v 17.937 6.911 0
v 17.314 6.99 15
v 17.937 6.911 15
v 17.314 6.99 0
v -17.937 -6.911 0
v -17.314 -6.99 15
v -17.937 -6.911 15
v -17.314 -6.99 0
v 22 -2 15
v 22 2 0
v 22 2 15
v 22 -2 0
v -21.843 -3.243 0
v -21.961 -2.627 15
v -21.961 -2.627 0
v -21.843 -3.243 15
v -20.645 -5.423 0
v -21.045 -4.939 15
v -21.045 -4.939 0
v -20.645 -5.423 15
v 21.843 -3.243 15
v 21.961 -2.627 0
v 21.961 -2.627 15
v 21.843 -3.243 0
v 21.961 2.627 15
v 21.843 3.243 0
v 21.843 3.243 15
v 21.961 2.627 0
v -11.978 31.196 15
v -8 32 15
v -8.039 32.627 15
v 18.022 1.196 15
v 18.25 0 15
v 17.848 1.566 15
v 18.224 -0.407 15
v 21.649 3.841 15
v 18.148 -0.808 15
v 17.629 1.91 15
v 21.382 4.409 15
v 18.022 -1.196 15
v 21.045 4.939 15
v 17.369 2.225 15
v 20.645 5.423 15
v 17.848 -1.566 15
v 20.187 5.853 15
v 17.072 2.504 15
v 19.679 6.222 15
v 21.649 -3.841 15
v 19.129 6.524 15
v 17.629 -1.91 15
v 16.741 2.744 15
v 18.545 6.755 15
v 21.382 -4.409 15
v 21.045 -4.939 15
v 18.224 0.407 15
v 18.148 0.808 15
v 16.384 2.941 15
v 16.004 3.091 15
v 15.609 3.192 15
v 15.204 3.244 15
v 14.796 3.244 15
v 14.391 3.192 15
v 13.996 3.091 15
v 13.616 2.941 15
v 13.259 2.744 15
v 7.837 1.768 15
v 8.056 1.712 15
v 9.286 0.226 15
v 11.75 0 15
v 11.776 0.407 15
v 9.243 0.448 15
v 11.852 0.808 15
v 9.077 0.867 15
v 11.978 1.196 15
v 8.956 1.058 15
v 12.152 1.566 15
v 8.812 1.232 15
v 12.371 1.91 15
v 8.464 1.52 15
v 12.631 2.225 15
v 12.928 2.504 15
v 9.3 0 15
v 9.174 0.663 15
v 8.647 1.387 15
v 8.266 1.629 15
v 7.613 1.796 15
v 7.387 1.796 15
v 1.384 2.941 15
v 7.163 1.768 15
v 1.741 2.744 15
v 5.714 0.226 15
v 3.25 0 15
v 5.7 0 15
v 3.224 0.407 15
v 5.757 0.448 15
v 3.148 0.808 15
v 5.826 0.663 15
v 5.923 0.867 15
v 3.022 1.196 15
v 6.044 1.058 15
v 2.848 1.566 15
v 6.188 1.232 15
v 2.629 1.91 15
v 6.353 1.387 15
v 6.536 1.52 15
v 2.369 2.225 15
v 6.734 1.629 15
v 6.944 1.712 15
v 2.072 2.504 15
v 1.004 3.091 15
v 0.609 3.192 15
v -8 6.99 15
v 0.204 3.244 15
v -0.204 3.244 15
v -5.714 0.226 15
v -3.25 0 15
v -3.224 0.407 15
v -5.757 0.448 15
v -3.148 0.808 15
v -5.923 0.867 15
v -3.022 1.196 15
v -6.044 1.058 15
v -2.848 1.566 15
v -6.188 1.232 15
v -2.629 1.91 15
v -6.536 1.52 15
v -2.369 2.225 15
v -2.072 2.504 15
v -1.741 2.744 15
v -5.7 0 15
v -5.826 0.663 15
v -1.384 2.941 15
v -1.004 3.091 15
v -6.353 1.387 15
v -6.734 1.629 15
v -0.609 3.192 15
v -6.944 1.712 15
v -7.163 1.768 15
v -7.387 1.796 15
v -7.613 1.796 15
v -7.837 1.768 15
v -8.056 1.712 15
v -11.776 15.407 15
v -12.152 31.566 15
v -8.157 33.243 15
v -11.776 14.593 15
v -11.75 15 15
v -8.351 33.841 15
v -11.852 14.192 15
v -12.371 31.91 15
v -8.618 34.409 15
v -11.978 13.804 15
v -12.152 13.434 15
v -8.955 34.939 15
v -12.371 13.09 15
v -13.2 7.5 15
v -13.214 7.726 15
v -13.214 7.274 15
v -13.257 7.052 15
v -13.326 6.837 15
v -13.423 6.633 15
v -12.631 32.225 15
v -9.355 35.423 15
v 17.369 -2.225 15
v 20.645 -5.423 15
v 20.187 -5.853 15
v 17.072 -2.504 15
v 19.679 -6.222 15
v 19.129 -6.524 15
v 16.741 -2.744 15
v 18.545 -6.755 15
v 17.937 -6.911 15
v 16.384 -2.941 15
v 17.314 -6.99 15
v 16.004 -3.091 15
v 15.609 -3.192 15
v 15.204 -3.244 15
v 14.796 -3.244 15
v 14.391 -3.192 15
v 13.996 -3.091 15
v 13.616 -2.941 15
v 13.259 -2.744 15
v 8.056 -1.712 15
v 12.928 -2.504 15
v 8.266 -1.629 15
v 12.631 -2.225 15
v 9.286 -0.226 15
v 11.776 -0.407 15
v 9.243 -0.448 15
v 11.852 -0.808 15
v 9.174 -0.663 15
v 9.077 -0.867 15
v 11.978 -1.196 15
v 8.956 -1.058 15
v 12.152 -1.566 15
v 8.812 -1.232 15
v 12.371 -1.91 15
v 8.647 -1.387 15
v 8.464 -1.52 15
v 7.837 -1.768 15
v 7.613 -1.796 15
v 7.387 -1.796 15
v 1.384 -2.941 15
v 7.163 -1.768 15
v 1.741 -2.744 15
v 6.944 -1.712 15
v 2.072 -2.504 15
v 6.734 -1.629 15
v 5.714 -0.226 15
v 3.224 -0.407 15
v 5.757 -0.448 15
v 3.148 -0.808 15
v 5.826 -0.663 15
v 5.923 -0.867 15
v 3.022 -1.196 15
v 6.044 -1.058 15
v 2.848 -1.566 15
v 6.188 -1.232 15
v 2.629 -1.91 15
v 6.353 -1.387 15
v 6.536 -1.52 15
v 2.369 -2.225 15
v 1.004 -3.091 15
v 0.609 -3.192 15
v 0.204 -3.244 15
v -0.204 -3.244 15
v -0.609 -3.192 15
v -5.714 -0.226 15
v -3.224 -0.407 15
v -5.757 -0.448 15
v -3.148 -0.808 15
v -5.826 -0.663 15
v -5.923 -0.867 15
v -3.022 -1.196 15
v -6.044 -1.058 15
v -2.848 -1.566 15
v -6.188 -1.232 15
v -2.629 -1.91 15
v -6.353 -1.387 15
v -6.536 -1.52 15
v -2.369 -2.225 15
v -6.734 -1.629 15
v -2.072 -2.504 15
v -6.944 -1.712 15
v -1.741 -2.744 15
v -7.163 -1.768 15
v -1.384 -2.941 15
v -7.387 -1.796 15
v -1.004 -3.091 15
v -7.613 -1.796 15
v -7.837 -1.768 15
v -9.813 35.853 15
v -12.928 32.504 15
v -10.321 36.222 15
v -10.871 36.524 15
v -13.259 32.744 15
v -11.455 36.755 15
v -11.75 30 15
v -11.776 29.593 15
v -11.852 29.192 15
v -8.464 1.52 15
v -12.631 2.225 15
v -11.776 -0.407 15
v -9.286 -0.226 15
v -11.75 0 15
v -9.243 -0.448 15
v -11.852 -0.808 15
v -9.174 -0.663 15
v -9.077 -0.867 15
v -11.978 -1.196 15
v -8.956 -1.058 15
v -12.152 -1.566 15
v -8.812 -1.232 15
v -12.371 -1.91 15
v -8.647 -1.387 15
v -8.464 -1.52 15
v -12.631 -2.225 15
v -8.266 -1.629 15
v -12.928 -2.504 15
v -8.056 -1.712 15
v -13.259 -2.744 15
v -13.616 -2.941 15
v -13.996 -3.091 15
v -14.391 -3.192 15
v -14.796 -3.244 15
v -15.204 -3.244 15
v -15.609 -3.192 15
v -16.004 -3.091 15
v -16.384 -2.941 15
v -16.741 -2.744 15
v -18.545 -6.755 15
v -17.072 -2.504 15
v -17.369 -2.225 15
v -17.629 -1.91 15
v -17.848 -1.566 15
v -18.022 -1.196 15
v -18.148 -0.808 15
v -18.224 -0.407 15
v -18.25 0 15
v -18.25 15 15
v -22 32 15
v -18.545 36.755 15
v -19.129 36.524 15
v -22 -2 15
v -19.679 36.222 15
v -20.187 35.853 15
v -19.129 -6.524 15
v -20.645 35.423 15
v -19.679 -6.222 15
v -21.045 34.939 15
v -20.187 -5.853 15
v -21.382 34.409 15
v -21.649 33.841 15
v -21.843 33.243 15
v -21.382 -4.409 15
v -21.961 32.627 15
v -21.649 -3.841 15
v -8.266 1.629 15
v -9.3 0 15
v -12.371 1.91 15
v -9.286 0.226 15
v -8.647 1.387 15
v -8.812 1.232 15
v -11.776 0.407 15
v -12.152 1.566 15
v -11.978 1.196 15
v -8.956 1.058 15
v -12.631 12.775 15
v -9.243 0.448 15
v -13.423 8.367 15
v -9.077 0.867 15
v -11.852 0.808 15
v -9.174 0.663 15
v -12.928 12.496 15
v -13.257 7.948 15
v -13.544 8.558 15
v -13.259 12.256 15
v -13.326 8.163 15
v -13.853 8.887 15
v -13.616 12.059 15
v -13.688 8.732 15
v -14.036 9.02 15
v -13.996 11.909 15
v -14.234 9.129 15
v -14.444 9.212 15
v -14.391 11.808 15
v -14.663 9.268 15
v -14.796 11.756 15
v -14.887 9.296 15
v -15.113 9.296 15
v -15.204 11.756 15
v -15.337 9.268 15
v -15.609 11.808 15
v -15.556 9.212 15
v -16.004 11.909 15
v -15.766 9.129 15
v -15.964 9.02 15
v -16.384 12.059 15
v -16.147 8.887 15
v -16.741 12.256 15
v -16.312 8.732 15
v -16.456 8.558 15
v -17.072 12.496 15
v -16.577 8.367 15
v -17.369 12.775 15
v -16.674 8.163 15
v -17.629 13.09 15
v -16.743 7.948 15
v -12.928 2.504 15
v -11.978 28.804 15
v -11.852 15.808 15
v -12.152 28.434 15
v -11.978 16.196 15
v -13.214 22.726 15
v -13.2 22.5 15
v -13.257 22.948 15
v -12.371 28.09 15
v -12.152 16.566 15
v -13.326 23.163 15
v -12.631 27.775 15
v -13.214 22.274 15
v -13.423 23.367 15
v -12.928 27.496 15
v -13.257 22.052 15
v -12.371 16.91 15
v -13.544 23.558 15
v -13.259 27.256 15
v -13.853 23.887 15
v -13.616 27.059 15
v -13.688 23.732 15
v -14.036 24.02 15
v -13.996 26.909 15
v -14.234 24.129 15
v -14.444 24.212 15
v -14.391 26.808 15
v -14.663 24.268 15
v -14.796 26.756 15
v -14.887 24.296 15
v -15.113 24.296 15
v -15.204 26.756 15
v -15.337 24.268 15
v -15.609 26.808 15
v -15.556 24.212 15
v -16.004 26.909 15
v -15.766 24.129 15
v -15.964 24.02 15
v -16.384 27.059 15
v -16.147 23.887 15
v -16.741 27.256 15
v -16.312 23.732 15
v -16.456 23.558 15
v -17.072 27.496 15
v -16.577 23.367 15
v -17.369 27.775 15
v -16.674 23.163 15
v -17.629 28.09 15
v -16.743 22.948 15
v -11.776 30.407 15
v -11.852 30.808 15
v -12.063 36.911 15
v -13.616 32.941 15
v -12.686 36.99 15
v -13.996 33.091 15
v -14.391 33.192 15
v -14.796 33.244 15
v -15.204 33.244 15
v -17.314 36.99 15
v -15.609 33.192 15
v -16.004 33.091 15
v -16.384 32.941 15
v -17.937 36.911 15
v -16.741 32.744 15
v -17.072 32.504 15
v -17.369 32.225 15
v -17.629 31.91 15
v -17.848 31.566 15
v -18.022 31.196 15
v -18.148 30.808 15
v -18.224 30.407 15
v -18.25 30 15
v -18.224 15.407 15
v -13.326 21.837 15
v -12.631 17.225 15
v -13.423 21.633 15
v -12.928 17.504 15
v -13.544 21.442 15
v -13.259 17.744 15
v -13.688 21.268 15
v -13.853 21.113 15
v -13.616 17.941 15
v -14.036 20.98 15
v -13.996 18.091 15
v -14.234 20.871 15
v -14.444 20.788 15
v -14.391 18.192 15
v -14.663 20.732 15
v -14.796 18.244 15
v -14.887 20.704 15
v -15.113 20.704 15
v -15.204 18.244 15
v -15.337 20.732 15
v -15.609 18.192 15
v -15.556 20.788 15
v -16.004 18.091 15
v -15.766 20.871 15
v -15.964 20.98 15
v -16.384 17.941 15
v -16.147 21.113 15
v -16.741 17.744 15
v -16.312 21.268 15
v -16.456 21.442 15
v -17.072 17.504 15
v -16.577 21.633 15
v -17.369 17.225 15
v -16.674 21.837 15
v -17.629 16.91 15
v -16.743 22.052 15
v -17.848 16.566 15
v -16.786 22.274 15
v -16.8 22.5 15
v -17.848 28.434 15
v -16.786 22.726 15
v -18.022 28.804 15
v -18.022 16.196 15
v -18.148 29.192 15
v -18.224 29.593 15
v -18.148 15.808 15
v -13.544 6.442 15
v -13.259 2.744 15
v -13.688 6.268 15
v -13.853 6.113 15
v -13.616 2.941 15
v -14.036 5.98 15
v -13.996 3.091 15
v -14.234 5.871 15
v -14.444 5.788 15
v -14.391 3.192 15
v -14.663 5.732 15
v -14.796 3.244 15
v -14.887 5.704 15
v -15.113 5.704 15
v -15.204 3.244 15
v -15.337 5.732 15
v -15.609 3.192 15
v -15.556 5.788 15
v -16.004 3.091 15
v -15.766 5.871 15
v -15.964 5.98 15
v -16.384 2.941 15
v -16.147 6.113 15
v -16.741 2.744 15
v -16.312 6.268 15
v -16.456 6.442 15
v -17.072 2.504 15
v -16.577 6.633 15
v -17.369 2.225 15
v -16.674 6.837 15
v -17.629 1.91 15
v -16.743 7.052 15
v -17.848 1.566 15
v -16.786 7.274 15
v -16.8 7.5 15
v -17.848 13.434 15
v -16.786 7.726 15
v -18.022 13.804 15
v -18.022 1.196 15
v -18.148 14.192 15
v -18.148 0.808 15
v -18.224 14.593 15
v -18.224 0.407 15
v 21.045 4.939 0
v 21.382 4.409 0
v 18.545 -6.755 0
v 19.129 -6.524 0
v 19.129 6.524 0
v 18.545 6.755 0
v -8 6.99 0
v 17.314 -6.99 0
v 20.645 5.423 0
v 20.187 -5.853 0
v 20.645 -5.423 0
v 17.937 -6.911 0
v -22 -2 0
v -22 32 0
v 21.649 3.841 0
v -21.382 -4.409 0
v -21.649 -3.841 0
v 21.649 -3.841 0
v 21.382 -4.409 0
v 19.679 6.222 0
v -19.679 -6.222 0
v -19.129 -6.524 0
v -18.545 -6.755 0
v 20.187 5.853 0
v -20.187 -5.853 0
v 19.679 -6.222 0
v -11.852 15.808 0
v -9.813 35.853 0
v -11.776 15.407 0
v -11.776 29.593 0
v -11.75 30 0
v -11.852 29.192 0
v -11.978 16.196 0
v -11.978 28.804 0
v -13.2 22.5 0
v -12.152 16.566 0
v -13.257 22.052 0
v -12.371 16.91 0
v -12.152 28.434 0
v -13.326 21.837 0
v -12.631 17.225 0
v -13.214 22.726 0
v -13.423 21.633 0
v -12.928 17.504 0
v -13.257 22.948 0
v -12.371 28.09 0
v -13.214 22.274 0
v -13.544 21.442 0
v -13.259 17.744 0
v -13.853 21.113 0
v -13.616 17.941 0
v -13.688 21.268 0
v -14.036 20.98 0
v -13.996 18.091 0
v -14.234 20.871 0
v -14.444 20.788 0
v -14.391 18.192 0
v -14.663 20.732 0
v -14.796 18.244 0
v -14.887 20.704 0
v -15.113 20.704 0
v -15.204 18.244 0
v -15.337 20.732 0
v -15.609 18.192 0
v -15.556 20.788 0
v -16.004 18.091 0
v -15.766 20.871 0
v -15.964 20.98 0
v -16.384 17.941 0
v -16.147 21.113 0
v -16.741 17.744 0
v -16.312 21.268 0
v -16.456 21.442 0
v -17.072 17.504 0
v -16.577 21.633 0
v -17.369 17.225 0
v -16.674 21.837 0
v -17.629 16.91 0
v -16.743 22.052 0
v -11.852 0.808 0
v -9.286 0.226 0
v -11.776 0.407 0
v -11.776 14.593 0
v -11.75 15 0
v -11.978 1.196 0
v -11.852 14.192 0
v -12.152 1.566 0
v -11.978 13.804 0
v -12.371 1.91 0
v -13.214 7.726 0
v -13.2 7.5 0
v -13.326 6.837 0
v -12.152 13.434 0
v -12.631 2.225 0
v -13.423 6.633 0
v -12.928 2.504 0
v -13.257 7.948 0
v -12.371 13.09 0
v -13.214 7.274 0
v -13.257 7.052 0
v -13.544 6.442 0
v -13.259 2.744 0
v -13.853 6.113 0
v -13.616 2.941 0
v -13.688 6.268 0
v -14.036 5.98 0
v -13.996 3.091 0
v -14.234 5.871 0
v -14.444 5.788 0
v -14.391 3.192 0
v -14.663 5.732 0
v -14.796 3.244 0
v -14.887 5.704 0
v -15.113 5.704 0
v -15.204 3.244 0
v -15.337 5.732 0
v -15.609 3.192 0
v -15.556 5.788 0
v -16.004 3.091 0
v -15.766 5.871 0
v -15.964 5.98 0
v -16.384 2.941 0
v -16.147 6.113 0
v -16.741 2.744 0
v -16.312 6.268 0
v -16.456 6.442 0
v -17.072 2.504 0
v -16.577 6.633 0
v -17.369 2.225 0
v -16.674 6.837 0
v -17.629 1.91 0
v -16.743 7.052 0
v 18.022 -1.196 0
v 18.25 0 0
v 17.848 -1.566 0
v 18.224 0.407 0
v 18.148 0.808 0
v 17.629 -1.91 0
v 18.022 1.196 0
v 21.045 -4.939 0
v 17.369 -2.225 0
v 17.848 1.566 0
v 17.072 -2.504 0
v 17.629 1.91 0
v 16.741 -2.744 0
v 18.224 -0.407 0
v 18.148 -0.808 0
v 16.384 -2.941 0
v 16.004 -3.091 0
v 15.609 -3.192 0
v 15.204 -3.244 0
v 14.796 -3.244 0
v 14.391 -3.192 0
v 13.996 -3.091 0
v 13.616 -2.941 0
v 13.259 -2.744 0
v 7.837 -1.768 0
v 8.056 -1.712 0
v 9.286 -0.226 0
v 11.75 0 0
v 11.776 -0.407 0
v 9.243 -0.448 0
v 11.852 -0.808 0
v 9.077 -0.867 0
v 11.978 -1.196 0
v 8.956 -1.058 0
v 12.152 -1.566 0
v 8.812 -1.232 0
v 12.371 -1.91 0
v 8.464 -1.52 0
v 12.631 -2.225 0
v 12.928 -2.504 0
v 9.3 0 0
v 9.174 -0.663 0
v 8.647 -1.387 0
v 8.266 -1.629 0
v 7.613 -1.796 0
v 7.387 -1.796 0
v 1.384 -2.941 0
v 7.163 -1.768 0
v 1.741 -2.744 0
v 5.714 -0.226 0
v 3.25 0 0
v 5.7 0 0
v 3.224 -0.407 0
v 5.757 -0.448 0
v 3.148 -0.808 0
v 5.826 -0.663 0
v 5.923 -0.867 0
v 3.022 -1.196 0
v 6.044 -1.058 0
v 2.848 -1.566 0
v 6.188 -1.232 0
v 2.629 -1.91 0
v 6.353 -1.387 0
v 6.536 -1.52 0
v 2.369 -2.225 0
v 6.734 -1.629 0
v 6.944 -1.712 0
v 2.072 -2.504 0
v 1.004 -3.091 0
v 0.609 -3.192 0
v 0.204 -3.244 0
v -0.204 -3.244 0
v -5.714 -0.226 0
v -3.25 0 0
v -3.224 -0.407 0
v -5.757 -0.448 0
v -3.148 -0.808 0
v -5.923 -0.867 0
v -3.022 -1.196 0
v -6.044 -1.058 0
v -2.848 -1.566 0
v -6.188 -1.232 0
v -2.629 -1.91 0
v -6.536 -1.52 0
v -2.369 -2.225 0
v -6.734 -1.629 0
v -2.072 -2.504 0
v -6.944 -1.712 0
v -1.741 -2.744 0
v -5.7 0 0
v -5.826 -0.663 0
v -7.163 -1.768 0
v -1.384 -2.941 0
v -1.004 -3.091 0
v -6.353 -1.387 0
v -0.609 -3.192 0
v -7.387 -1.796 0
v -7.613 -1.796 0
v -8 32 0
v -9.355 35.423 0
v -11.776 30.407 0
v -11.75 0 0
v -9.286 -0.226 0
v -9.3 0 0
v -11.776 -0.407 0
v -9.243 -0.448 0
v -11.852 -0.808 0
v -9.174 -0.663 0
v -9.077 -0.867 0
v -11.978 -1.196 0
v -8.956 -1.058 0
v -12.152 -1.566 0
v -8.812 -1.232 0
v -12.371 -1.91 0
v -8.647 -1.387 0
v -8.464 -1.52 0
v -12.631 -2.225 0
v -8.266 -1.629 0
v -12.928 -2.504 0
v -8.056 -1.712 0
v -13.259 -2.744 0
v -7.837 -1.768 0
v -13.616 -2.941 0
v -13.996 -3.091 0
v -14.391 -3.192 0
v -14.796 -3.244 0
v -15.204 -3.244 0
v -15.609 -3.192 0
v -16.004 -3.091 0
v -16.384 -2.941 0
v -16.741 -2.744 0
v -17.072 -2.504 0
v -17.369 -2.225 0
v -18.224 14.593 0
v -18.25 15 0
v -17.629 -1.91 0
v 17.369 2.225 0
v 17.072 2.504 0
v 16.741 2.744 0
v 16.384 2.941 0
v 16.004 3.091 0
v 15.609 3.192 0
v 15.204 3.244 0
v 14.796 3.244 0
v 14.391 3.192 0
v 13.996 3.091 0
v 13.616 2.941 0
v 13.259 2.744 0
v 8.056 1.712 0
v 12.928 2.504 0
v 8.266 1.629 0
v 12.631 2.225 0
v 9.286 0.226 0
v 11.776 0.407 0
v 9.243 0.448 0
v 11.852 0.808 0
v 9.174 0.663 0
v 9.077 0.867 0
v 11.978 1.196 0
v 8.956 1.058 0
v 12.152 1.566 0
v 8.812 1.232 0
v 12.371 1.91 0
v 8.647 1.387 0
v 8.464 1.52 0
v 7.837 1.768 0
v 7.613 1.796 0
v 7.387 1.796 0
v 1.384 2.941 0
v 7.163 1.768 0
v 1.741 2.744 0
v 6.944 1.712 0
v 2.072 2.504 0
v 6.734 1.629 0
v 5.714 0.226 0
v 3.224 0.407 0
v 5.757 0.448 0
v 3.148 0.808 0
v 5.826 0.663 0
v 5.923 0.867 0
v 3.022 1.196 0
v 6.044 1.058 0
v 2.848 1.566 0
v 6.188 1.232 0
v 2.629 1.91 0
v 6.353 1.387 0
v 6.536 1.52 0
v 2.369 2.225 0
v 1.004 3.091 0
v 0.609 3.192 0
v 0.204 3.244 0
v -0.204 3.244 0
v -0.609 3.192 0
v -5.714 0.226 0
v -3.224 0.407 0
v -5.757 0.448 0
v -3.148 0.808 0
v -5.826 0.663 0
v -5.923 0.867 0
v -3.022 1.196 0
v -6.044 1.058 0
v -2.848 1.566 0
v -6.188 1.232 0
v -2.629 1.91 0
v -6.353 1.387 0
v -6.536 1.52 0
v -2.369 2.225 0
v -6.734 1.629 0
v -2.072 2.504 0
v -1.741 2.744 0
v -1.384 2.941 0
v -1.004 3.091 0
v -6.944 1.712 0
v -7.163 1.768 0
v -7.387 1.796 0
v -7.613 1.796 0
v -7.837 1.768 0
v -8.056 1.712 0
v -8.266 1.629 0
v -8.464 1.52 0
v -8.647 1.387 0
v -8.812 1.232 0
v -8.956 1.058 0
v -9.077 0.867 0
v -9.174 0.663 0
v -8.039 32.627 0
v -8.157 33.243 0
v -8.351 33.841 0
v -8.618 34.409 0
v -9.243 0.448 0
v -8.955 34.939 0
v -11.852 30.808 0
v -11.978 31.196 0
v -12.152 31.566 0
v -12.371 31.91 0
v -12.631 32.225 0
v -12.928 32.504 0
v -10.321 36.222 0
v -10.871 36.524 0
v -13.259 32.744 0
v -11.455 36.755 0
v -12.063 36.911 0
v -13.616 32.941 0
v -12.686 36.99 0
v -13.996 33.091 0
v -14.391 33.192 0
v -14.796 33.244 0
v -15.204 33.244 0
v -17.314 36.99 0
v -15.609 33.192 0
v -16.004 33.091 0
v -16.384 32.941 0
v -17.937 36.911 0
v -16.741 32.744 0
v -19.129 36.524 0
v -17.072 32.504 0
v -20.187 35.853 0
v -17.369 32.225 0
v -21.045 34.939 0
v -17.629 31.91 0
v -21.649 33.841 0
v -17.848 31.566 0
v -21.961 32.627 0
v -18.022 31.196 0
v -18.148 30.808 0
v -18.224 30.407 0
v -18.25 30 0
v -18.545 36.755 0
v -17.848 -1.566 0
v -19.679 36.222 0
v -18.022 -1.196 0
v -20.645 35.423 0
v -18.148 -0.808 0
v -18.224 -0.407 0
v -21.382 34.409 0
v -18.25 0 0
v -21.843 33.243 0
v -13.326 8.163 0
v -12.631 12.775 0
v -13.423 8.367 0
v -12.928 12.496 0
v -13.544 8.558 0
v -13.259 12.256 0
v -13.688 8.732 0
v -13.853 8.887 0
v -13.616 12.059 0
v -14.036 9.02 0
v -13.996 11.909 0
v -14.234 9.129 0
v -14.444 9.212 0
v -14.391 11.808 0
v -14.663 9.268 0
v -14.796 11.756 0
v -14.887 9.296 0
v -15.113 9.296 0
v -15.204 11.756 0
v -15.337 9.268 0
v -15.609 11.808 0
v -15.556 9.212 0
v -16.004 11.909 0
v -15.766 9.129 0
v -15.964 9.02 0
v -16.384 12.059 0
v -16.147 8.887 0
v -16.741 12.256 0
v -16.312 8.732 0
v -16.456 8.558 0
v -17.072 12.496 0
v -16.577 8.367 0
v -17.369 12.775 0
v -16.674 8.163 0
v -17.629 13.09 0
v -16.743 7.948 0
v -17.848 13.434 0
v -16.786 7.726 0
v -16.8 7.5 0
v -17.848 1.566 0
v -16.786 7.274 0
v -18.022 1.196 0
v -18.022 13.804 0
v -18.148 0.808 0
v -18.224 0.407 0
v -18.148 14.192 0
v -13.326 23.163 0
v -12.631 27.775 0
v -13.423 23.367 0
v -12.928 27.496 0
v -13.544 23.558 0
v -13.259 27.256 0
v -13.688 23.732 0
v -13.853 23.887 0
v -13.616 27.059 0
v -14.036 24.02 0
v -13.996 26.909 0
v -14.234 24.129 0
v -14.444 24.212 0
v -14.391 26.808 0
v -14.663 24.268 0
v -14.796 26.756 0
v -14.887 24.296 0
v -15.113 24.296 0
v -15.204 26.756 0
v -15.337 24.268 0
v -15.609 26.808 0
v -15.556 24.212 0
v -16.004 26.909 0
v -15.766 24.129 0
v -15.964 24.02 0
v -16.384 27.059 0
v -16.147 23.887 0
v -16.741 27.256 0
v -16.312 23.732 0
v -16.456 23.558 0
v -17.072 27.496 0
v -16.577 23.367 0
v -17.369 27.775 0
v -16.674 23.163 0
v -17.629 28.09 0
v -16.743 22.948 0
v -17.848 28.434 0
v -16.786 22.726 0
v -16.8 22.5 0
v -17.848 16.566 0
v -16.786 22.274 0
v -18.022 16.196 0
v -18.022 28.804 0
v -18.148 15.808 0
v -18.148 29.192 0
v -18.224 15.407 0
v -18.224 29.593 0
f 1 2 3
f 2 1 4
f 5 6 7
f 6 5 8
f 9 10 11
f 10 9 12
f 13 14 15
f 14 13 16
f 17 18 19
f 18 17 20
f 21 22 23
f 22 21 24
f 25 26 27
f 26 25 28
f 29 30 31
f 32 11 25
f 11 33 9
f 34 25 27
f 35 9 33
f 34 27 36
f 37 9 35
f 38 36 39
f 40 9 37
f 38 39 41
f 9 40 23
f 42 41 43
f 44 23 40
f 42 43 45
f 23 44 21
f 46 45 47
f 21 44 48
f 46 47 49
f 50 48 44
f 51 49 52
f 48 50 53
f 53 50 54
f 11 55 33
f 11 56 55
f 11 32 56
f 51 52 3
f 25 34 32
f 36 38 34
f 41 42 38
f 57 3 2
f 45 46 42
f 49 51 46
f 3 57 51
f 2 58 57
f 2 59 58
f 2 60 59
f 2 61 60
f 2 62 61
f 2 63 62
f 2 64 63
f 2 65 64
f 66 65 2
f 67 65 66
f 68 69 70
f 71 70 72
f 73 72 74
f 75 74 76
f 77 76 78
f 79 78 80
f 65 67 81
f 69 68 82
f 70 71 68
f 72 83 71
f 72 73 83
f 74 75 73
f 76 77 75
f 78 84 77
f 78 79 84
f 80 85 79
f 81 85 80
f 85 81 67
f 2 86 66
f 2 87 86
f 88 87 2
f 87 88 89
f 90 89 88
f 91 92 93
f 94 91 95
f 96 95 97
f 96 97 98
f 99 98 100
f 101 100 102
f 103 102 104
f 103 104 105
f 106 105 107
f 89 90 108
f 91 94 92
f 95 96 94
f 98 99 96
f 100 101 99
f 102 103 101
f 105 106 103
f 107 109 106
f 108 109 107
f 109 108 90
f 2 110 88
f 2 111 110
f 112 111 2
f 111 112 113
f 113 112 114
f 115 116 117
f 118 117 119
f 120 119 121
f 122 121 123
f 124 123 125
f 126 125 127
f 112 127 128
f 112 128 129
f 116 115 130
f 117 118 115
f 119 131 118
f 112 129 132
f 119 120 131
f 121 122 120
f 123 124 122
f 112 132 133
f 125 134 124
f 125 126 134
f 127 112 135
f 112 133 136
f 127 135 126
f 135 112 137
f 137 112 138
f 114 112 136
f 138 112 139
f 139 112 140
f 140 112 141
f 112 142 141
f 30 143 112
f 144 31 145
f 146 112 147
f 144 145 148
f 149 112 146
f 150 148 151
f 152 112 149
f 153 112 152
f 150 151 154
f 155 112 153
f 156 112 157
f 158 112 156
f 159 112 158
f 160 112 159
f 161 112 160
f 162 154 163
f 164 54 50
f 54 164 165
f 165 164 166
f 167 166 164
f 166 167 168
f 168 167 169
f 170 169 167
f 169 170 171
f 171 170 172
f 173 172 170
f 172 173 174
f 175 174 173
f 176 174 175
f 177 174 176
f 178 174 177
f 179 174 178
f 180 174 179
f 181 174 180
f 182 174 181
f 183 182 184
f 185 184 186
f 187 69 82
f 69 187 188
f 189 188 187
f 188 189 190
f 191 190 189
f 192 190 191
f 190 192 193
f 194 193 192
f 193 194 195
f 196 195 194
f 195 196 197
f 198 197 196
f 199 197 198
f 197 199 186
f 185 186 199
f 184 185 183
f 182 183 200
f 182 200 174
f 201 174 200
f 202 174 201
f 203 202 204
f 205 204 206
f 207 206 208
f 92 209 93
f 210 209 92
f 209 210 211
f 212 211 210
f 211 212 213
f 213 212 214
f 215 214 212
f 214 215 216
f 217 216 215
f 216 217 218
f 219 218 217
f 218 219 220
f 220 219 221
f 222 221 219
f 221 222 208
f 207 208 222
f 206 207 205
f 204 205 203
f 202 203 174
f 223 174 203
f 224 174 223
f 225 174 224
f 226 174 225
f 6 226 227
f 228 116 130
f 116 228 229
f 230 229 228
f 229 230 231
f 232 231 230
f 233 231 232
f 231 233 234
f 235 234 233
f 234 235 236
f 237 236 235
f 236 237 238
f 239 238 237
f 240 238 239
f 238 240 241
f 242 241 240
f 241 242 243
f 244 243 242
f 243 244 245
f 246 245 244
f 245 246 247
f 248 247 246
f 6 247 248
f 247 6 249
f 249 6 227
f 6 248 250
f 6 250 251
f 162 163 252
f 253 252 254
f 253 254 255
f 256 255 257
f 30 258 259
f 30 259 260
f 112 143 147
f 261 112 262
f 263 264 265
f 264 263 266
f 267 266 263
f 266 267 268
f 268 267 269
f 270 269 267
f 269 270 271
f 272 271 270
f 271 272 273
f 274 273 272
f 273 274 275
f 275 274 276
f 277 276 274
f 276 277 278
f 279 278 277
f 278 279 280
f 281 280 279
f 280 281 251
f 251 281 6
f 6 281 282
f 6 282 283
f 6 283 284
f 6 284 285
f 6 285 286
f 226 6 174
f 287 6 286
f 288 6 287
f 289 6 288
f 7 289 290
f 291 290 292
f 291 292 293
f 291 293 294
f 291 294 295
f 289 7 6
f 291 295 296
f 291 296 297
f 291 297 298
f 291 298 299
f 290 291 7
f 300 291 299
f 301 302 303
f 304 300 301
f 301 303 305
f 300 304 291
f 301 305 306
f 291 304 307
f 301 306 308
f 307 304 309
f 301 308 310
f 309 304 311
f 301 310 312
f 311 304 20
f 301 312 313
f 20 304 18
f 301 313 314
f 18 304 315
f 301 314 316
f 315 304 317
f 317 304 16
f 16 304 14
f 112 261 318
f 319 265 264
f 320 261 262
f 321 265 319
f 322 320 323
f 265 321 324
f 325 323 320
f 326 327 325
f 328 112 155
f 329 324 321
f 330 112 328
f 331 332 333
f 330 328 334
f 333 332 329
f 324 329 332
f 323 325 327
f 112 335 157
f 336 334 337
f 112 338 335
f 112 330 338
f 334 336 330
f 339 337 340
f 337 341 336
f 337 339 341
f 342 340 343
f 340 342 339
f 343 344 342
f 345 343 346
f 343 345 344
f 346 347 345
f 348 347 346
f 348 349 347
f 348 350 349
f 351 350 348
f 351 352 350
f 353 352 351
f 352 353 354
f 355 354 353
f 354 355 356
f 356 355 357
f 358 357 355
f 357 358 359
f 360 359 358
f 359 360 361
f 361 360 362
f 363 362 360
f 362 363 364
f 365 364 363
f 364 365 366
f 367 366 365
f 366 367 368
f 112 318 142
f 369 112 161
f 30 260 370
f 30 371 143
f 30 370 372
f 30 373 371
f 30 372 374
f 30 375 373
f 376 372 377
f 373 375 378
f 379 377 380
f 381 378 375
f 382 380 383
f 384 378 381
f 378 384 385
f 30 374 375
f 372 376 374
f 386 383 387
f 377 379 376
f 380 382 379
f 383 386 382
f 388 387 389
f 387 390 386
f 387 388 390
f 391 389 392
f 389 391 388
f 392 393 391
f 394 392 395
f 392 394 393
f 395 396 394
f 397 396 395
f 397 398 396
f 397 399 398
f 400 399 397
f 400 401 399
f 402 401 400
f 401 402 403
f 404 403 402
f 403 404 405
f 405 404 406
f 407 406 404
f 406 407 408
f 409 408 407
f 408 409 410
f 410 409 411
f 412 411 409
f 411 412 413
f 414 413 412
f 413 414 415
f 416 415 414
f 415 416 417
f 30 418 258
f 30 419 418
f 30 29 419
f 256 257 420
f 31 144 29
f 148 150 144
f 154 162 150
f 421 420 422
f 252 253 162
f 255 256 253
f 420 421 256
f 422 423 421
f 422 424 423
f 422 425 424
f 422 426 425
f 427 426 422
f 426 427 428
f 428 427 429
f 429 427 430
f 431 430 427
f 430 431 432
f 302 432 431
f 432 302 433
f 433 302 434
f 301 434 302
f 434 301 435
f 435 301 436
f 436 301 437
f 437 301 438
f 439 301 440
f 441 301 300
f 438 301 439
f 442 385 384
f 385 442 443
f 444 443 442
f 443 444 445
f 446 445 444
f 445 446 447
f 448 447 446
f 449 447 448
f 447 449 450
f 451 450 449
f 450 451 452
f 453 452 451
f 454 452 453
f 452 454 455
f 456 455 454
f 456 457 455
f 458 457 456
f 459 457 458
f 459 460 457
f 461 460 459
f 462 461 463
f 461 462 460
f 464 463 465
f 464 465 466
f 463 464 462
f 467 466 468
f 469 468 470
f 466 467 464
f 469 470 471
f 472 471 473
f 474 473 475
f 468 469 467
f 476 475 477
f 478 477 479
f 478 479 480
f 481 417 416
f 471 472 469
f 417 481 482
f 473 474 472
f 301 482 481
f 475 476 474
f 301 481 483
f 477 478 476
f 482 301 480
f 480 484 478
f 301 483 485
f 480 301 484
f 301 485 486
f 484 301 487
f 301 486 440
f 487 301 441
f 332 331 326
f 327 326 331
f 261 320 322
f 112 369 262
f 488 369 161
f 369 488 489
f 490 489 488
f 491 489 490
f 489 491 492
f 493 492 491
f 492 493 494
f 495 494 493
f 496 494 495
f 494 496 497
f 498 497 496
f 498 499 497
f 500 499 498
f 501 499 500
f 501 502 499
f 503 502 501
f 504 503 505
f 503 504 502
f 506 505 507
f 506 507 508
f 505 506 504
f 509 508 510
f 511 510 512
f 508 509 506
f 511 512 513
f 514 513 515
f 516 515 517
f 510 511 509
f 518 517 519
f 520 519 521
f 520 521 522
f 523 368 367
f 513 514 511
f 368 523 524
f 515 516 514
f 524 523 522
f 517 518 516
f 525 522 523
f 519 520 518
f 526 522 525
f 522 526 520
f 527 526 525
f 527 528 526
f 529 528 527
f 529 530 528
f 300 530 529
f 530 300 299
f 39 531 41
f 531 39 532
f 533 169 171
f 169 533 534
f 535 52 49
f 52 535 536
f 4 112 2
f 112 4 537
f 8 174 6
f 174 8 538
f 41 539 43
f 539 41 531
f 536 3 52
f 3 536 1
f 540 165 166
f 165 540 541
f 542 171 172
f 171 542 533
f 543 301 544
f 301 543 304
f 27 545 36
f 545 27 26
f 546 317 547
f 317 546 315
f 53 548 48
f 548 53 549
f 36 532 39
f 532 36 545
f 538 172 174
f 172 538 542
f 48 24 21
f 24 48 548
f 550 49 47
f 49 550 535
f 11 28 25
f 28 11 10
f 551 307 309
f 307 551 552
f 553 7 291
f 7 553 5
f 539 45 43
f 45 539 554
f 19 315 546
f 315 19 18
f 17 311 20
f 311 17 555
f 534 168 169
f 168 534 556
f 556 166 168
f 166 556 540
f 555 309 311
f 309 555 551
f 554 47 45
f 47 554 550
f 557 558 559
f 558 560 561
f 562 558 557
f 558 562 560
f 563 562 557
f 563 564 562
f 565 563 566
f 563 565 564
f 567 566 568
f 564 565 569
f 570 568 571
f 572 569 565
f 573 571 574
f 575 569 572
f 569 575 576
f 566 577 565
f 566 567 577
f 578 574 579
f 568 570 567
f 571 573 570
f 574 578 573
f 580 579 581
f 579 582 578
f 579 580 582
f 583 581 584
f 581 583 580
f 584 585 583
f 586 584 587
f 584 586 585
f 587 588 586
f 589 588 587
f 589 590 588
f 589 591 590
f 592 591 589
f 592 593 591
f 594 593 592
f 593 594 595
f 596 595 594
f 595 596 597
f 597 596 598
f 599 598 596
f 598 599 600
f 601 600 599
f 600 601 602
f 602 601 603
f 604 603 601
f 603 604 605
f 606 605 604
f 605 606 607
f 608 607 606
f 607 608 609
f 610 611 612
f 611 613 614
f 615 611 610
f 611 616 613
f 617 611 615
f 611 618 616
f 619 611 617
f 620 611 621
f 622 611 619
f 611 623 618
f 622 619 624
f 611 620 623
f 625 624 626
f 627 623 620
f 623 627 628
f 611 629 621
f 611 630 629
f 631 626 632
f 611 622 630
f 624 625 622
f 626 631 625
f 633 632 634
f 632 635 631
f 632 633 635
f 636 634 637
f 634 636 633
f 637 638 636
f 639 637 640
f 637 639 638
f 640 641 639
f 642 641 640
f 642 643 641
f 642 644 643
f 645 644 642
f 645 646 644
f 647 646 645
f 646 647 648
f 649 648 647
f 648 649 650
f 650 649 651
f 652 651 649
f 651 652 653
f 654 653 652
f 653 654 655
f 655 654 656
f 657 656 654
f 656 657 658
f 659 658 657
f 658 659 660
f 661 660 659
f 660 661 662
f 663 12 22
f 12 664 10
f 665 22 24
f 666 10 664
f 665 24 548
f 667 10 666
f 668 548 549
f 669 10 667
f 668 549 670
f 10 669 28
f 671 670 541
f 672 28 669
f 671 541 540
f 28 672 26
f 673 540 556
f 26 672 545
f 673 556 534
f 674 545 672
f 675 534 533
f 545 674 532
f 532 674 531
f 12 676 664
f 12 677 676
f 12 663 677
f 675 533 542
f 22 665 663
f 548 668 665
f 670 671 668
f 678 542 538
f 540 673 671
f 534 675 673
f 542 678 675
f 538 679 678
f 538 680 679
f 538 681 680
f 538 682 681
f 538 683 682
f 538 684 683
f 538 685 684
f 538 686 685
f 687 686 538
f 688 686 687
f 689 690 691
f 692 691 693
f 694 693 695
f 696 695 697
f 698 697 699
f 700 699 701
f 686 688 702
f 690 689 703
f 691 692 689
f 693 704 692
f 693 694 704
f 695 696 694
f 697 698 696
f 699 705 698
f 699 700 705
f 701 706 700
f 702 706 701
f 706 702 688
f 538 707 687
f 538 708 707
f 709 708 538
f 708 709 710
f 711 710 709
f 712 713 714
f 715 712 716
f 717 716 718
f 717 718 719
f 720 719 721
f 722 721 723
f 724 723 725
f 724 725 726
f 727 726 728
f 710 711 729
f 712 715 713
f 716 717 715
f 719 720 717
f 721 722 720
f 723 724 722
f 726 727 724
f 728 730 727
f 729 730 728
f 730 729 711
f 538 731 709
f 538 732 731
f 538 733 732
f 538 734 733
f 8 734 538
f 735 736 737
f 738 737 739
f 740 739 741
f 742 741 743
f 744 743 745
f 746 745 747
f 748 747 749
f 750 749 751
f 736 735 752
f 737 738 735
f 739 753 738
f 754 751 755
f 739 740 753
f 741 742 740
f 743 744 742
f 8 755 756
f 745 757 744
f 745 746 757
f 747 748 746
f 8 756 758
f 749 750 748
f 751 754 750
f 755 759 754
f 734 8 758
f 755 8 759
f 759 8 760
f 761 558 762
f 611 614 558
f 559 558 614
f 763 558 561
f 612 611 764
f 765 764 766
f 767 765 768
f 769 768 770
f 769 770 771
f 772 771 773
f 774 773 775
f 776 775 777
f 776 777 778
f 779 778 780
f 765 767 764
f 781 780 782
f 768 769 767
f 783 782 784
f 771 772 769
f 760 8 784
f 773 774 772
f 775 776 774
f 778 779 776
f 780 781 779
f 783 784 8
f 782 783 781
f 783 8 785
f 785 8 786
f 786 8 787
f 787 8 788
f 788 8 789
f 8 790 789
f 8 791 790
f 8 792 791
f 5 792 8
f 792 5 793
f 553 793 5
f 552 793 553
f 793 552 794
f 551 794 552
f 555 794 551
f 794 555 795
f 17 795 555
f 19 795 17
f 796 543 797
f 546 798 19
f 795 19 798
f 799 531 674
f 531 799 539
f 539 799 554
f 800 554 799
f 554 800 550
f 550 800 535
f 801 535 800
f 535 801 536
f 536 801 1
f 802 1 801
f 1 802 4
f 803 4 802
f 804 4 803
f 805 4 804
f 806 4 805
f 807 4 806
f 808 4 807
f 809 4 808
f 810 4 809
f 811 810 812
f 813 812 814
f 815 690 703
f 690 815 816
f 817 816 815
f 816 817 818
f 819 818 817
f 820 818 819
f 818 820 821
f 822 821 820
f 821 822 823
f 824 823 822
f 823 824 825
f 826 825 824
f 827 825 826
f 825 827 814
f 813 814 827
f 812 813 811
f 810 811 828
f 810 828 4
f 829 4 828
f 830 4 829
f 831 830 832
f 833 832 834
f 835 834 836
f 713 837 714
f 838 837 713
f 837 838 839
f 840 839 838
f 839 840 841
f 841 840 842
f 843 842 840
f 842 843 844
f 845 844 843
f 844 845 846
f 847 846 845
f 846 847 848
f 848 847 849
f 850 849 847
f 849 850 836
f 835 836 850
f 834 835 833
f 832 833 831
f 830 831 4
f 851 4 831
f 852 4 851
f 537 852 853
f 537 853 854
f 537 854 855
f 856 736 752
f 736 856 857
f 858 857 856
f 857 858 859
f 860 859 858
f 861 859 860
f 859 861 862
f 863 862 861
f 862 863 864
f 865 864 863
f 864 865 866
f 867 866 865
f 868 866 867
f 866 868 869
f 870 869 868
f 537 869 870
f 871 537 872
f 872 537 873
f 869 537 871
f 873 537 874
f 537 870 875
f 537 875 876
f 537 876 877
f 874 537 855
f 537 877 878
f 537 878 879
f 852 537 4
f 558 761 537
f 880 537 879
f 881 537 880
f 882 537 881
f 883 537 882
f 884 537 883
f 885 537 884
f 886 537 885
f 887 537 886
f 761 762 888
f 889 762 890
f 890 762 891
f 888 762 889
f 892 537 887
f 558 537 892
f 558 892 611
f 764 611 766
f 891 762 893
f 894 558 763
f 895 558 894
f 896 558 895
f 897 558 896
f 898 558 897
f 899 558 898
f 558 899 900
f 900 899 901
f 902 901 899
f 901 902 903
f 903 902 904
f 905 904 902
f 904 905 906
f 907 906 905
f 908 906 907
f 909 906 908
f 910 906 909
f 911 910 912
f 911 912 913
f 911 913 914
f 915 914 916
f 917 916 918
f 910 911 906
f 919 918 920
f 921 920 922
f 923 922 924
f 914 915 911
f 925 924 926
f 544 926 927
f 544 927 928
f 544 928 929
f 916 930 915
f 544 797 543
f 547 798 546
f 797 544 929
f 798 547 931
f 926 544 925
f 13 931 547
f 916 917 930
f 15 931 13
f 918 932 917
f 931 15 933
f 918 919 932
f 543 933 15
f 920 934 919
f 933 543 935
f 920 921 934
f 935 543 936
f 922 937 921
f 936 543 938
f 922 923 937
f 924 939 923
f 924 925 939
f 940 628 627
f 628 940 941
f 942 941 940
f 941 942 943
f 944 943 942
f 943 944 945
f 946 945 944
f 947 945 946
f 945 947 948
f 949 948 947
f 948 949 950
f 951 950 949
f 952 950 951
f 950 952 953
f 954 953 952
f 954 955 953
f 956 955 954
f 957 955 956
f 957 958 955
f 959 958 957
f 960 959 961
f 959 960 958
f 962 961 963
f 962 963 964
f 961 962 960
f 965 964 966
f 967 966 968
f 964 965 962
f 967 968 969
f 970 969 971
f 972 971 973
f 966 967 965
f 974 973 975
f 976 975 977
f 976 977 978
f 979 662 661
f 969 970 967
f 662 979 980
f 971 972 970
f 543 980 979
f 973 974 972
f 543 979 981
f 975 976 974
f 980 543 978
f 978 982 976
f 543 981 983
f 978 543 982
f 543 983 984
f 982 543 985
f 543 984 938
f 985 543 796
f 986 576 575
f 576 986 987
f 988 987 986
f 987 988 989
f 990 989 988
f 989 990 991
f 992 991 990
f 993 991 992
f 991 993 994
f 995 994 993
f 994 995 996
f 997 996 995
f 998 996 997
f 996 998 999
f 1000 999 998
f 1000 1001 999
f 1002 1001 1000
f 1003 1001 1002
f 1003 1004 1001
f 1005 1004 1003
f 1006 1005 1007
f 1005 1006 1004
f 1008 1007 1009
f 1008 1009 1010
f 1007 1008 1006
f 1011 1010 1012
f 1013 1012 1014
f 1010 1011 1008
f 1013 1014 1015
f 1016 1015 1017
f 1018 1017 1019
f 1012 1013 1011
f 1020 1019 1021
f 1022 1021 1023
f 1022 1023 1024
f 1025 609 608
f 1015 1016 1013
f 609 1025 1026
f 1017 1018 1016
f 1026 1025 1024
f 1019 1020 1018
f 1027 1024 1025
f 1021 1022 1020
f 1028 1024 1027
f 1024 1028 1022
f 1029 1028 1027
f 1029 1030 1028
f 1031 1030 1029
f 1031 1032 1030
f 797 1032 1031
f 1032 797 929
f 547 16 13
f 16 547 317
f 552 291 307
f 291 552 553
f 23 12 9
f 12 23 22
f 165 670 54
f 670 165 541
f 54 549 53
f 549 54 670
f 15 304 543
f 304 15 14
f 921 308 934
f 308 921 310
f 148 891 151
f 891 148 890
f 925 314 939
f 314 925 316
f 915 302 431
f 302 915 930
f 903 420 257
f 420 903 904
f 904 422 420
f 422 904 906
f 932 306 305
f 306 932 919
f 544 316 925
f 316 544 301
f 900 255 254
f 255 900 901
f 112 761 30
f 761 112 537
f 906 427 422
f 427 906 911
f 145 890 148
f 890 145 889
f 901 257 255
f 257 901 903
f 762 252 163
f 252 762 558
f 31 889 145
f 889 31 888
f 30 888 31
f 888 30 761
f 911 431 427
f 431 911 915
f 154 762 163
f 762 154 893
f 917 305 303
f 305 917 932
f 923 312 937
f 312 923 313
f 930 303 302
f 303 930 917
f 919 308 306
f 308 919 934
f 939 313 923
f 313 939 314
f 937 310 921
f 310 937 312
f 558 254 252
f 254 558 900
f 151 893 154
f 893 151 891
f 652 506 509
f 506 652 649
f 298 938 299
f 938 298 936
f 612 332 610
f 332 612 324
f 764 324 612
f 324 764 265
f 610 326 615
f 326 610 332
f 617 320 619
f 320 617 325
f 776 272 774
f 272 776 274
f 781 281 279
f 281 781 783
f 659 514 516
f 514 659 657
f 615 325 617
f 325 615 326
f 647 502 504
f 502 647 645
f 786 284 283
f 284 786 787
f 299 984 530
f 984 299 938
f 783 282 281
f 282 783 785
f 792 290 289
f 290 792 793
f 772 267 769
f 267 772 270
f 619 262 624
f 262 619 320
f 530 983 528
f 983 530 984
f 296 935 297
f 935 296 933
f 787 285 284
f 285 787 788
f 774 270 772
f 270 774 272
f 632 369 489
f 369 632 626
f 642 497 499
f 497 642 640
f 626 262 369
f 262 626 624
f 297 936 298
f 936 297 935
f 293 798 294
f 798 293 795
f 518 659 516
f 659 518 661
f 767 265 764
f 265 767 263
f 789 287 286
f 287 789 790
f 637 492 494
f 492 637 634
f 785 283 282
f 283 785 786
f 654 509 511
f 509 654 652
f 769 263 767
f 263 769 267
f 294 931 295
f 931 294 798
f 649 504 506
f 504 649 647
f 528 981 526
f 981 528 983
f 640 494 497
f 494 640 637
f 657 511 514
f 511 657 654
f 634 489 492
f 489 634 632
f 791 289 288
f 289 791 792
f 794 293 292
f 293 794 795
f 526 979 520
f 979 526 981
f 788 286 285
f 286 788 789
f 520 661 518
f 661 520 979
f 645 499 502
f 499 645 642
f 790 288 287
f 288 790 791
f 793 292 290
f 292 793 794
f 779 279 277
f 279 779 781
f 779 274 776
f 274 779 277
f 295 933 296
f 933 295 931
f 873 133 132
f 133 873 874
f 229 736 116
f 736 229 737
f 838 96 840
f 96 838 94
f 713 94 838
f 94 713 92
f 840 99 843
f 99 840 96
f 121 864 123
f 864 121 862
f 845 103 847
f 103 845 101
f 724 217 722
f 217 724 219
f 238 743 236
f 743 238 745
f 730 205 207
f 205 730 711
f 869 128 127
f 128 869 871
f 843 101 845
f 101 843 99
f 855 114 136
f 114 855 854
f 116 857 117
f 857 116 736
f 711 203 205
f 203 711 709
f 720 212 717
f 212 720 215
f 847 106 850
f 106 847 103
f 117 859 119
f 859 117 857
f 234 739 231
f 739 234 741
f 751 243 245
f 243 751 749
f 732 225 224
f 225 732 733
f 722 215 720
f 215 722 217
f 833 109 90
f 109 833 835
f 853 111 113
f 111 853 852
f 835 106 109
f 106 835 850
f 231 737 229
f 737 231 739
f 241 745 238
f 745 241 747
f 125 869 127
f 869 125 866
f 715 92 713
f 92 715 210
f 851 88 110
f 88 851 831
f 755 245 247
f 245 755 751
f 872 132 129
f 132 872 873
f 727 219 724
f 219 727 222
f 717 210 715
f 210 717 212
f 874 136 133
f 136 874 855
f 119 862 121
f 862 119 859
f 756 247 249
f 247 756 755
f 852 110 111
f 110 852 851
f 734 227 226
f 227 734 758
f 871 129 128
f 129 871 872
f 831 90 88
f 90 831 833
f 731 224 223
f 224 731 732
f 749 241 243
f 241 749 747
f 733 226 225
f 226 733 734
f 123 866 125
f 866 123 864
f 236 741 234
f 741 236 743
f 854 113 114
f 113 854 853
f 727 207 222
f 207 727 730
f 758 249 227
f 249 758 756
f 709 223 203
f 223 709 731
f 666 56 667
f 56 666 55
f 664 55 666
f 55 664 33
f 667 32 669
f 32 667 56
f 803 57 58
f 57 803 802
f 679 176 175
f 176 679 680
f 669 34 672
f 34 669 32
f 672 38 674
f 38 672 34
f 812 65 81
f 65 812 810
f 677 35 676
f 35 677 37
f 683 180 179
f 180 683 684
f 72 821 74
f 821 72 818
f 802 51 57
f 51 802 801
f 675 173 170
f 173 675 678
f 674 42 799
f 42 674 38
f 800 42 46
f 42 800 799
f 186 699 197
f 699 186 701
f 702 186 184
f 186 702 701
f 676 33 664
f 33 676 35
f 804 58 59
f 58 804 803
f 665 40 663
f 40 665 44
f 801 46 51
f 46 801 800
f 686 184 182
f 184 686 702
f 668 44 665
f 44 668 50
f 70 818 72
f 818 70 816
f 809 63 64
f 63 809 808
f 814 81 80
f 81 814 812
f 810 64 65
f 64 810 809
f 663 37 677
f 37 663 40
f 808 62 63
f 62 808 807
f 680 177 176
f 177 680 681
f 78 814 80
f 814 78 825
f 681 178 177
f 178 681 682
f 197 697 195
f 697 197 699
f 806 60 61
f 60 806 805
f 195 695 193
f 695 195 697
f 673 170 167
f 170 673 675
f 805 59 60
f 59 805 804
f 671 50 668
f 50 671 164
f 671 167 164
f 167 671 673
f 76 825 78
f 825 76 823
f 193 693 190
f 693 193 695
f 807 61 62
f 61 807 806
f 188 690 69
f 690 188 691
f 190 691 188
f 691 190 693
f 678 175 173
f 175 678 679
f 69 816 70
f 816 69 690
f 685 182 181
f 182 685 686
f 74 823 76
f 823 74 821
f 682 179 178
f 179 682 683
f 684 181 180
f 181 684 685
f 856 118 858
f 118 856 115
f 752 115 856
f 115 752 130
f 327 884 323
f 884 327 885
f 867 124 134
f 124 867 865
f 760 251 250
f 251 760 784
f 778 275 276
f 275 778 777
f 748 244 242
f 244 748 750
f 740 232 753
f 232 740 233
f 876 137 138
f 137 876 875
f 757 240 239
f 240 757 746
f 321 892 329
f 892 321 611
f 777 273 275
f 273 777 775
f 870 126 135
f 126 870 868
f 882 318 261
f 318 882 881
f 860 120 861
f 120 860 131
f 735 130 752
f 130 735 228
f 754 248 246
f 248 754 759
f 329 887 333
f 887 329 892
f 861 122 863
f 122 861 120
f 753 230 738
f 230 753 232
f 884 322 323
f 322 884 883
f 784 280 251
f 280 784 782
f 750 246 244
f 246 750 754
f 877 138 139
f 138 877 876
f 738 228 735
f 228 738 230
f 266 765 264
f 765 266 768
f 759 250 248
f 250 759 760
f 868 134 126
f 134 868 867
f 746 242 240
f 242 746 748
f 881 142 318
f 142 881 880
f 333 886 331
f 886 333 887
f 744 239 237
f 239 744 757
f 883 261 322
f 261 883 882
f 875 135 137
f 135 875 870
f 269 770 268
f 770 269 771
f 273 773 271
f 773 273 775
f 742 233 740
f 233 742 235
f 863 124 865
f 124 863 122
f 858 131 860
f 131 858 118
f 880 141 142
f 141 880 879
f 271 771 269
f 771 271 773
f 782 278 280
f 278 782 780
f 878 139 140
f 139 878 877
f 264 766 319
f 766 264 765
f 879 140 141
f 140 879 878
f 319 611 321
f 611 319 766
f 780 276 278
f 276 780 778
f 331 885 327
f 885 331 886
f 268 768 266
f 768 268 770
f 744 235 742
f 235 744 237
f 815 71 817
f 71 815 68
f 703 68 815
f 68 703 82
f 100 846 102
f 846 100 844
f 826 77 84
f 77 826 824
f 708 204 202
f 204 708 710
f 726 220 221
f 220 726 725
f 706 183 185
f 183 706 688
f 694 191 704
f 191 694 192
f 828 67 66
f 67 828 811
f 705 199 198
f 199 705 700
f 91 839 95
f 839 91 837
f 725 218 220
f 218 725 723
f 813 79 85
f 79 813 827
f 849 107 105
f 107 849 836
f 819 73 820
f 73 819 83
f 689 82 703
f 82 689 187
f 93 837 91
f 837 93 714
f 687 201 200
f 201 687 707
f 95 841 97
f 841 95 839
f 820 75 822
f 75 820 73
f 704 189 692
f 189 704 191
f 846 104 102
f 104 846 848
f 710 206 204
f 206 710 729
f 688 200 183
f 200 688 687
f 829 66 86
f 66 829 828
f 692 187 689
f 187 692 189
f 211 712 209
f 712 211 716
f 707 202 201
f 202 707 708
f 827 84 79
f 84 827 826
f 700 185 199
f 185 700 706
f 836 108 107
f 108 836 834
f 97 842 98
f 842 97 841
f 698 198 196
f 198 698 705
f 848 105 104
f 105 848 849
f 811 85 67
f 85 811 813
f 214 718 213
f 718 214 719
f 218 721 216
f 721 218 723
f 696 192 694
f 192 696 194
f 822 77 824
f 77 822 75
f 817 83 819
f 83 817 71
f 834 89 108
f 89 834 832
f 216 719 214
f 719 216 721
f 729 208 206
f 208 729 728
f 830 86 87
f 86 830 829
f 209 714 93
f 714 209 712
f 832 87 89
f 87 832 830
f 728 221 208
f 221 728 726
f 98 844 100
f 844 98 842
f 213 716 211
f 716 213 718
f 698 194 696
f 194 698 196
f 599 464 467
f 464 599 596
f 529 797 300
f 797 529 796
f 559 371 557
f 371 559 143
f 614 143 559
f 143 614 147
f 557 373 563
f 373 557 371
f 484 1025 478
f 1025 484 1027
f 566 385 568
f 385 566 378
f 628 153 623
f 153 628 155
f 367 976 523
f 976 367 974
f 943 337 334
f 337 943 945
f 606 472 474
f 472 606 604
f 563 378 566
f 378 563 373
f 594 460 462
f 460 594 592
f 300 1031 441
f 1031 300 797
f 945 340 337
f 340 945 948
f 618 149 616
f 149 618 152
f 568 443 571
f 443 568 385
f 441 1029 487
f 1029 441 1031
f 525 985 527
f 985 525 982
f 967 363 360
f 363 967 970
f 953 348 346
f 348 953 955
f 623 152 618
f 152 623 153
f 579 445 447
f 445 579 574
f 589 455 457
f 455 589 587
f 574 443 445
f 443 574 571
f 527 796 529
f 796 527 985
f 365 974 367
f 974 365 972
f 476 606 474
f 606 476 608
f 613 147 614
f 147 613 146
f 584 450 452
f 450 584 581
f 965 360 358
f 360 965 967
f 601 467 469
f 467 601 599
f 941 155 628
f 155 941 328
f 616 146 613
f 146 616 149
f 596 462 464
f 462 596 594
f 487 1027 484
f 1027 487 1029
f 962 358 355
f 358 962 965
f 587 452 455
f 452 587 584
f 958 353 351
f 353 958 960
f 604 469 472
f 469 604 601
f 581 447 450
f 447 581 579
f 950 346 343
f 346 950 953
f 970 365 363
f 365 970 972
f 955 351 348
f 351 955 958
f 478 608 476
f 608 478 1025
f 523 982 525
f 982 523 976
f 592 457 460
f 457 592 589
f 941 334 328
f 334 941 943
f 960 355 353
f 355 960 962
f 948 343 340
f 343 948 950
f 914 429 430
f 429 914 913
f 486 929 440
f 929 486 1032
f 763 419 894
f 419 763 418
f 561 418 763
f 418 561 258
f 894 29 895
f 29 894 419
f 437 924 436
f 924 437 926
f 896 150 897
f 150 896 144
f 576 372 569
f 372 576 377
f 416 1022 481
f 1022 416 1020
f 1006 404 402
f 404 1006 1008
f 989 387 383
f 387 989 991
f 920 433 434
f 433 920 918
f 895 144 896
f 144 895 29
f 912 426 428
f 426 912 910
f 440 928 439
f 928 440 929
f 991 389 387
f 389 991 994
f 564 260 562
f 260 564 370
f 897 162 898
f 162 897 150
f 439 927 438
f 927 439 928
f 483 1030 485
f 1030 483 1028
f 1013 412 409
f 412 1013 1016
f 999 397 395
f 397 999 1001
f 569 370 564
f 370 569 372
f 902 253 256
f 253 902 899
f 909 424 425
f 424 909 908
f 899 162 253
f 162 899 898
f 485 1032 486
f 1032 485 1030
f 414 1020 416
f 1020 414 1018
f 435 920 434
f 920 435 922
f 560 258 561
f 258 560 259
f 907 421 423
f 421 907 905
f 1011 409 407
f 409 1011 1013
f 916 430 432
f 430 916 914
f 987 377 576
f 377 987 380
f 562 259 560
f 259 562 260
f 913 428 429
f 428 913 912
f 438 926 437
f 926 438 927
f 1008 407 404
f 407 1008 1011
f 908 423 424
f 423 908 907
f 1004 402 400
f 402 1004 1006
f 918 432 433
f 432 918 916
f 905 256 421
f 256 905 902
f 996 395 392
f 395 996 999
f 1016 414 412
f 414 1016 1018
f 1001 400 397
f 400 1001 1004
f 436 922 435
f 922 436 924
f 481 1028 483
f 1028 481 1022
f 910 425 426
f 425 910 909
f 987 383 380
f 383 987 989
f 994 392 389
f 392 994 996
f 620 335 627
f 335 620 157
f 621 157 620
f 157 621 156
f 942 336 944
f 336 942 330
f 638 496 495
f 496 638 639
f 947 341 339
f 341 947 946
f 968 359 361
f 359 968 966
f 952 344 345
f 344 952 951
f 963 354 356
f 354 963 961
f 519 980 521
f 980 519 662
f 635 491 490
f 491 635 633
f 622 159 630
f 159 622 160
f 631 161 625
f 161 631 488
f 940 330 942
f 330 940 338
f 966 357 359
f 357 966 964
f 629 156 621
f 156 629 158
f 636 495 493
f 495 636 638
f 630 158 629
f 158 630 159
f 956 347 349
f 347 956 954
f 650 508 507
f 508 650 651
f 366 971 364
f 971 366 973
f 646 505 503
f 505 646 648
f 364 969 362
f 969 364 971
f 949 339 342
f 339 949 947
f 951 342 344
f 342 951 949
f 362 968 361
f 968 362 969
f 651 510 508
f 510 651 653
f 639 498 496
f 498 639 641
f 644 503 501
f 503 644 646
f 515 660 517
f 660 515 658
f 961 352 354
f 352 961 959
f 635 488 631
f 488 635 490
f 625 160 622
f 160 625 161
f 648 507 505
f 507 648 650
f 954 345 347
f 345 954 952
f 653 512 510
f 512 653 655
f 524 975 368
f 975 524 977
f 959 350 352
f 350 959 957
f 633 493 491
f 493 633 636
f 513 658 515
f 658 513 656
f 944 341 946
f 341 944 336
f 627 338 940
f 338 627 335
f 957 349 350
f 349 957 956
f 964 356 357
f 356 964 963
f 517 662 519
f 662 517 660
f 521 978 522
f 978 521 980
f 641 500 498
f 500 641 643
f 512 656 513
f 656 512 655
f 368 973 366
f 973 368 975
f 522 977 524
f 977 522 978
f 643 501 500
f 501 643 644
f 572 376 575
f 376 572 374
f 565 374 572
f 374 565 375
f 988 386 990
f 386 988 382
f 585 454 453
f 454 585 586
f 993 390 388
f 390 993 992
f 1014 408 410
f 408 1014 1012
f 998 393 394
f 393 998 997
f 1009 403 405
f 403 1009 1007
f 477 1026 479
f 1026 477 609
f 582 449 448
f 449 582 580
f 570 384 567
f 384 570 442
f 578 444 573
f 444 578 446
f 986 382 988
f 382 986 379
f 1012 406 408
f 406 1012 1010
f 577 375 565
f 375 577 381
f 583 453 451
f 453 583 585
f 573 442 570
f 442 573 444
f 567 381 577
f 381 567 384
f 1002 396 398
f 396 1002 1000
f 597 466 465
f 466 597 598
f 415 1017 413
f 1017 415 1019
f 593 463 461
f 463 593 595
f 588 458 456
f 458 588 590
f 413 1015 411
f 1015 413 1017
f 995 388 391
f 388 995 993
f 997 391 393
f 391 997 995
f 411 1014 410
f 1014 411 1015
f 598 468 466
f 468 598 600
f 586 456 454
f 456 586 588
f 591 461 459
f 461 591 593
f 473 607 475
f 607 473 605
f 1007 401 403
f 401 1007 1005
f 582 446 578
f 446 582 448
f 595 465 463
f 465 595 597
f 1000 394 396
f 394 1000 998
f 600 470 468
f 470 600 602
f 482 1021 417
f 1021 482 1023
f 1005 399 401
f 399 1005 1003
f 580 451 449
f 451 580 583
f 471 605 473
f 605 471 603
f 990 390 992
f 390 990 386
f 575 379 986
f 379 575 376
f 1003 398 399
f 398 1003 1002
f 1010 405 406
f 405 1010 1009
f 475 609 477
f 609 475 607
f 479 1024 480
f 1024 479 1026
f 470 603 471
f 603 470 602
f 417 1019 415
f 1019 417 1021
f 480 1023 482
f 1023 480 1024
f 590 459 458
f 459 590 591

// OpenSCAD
$fn = 50;


difference() {
	union() {
		*color(alpha = 1.0000000000, c = "gray") {
			translate(v = [0, 7, 0]) {
				linear_extrude(height = 1) {
					text(font = "Arial:style=Bold", halign = "center", size = 4.5000000000, text = "COMMENT plate main", valign = "center");
				}
			}
		}
		hull() {
			translate(v = [-17.0000000000, 2.0000000000, 0]) {
				cylinder(h = 15, r = 5);
			}
			translate(v = [17.0000000000, 2.0000000000, 0]) {
				cylinder(h = 15, r = 5);
			}
			translate(v = [-17.0000000000, -2.0000000000, 0]) {
				cylinder(h = 15, r = 5);
			}
			translate(v = [17.0000000000, -2.0000000000, 0]) {
				cylinder(h = 15, r = 5);
			}
		}
		*color(alpha = 1.0000000000, c = "gray") {
			translate(v = [0, 7, 0]) {
				linear_extrude(height = 1) {
					text(font = "Arial:style=Bold", halign = "center", size = 4.5000000000, text = "COMMENT plate main", valign = "center");
				}
			}
		}
		translate(v = [-15.0000000000, 15.0000000000, 0]) {
			hull() {
				translate(v = [-2.0000000000, 17.0000000000, 0]) {
					cylinder(h = 15, r = 5);
				}
				translate(v = [2.0000000000, 17.0000000000, 0]) {
					cylinder(h = 15, r = 5);
				}
				translate(v = [-2.0000000000, -17.0000000000, 0]) {
					cylinder(h = 15, r = 5);
				}
				translate(v = [2.0000000000, -17.0000000000, 0]) {
					cylinder(h = 15, r = 5);
				}
			}
		}
	}
	union() {
		*color(alpha = 1.0000000000, c = "gray") {
			translate(v = [0, 7, 0]) {
				linear_extrude(height = 1) {
					text(font = "Arial:style=Bold", halign = "center", size = 4.5000000000, text = "COMMENT holes main", valign = "center");
				}
			}
		}
		translate(v = [-15.0000000000, 0.0000000000, 0]) {
			translate(v = [0, 0, -100]) {
				cylinder(h = 200, r = 3.2500000000);
			}
		}
		translate(v = [0, 0, -100]) {
			cylinder(h = 200, r = 3.2500000000);
		}
		translate(v = [15.0000000000, 0.0000000000, 0]) {
			translate(v = [0, 0, -100]) {
				cylinder(h = 200, r = 3.2500000000);
			}
		}
		translate(v = [-15.0000000000, 0.0000000000, 0]) {
			translate(v = [0, 0, -100]) {
				cylinder(h = 200, r = 1.8000000000);
			}
		}
		translate(v = [-7.5000000000, 0.0000000000, 0]) {
			translate(v = [0, 0, -100]) {
				cylinder(h = 200, r = 1.8000000000);
			}
		}
		translate(v = [0, 0, -100]) {
			cylinder(h = 200, r = 1.8000000000);
		}
		translate(v = [7.5000000000, 0.0000000000, 0]) {
			translate(v = [0, 0, -100]) {
				cylinder(h = 200, r = 1.8000000000);
			}
		}
		translate(v = [15.0000000000, 0.0000000000, 0]) {
			translate(v = [0, 0, -100]) {
				cylinder(h = 200, r = 1.8000000000);
			}
		}
		*color(alpha = 1.0000000000, c = "gray") {
			translate(v = [0, 7, 0]) {
				linear_extrude(height = 1) {
					text(font = "Arial:style=Bold", halign = "center", size = 4.5000000000, text = "COMMENT holes main", valign = "center");
				}
			}
		}
		translate(v = [-15.0000000000, 0.0000000000, 0]) {
			translate(v = [0, 0, -100]) {
				cylinder(h = 200, r = 3.2500000000);
			}
		}
		translate(v = [-15.0000000000, 15.0000000000, 0]) {
			translate(v = [0, 0, -100]) {
				cylinder(h = 200, r = 3.2500000000);
			}
		}
		translate(v = [-15.0000000000, 30.0000000000, 0]) {
			translate(v = [0, 0, -100]) {
				cylinder(h = 200, r = 3.2500000000);
			}
		}
		translate(v = [-15.0000000000, 0.0000000000, 0]) {
			translate(v = [0, 0, -100]) {
				cylinder(h = 200, r = 1.8000000000);
			}
		}
		translate(v = [-15.0000000000, 7.5000000000, 0]) {
			translate(v = [0, 0, -100]) {
				cylinder(h = 200, r = 1.8000000000);
			}
		}
		translate(v = [-15.0000000000, 15.0000000000, 0]) {
			translate(v = [0, 0, -100]) {
				cylinder(h = 200, r = 1.8000000000);
			}
		}
		translate(v = [-15.0000000000, 22.5000000000, 0]) {
			translate(v = [0, 0, -100]) {
				cylinder(h = 200, r = 1.8000000000);
			}
		}
		translate(v = [-15.0000000000, 30.0000000000, 0]) {
			translate(v = [0, 0, -100]) {
				cylinder(h = 200, r = 1.8000000000);
			}
		}
	}
}
